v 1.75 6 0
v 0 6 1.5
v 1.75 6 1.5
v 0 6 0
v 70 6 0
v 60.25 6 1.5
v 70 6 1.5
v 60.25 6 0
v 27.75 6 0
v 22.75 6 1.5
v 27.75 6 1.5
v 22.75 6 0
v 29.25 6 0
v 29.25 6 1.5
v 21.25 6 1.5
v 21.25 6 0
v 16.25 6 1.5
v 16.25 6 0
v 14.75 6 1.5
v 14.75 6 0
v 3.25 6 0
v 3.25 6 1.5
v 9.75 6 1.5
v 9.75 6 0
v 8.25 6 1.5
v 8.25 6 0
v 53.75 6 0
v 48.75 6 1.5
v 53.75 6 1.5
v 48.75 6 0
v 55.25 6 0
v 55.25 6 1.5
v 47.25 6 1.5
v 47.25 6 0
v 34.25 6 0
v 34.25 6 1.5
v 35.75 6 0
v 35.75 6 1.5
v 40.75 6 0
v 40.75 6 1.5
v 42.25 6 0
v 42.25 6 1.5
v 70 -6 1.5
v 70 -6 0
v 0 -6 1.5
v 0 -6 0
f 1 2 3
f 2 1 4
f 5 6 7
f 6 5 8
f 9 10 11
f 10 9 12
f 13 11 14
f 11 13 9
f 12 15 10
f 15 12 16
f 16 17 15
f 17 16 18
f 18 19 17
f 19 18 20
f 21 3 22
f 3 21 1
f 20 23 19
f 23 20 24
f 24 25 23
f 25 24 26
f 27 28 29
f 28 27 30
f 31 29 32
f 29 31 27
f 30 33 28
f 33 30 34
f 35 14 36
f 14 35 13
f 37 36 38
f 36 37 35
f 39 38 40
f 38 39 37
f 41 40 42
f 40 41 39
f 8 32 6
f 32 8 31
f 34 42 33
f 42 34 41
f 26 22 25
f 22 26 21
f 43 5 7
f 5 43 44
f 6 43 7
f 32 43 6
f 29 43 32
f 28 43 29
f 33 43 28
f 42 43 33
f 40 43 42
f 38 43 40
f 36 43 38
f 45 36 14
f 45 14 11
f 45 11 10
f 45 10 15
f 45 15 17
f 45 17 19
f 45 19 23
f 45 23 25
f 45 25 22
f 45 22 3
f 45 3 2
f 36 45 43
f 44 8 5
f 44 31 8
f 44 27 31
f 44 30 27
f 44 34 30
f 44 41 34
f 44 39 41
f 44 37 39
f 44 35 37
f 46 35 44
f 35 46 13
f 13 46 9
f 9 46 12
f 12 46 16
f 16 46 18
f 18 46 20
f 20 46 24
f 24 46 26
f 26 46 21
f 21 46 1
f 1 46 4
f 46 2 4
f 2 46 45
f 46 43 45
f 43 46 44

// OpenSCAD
// 10-well agarose gel comb - flat plate with spine and hanging teeth.
// Orientation: Lying flat on XY plane, spine along X, teeth hanging in -Y.

// Dimensions
spine_len = 70;
spine_w   = 12;
comb_thk  = 1.5;

tooth_w   = 5.0;
tooth_l   = 12;
tooth_gap = 1.5;
num_teeth = 10;

$fn = 64;

// Calculate total width of the tooth row
tooth_row_w = num_teeth * tooth_w + (num_teeth - 1) * tooth_gap;

// Position the tooth row so it is centred on the spine in X
// The spine is centred at X=0. The tooth row starts at X = -(spine_len - tooth_row_w)/2
tooth_row_x_start = -(spine_len - tooth_row_w) / 2;

// The teeth hang from the top edge of the spine (Y = spine_w / 2)
// The teeth extend in the -Y direction.
// Tooth Y range: [spine_w/2 - tooth_l, spine_w/2]
// Spine Y range: [-spine_w/2, spine_w/2]

difference() {
    // 1. The main spine (back bar)
    translate([0, -spine_w / 2, 0]) 
        cube([spine_len, spine_w, comb_thk]);

    // 2. The teeth (cutting shapes)
    // We iterate through each tooth and cut it out of the spine.
    // The teeth are arranged in a row.
    // Position of tooth i (0 to num_teeth-1):
    // x = tooth_row_x_start + i * (tooth_w + tooth_gap)
    // y = spine_w / 2 (top edge of spine)
    for (i = [0 : num_teeth - 1]) {
        tx = tooth_row_x_start + i * (tooth_w + tooth_gap);
        
        // Cut the tooth shape. 
        // The tooth is a rectangle of width tooth_w and length tooth_l.
        // It hangs from the top edge of the spine.
        // We extend the cut slightly past the spine thickness to ensure clean separation.
        translate([tx, spine_w / 2, 0]) 
            cube([tooth_w, tooth_l + 0.1, comb_thk + 0.1]);
    }
}
